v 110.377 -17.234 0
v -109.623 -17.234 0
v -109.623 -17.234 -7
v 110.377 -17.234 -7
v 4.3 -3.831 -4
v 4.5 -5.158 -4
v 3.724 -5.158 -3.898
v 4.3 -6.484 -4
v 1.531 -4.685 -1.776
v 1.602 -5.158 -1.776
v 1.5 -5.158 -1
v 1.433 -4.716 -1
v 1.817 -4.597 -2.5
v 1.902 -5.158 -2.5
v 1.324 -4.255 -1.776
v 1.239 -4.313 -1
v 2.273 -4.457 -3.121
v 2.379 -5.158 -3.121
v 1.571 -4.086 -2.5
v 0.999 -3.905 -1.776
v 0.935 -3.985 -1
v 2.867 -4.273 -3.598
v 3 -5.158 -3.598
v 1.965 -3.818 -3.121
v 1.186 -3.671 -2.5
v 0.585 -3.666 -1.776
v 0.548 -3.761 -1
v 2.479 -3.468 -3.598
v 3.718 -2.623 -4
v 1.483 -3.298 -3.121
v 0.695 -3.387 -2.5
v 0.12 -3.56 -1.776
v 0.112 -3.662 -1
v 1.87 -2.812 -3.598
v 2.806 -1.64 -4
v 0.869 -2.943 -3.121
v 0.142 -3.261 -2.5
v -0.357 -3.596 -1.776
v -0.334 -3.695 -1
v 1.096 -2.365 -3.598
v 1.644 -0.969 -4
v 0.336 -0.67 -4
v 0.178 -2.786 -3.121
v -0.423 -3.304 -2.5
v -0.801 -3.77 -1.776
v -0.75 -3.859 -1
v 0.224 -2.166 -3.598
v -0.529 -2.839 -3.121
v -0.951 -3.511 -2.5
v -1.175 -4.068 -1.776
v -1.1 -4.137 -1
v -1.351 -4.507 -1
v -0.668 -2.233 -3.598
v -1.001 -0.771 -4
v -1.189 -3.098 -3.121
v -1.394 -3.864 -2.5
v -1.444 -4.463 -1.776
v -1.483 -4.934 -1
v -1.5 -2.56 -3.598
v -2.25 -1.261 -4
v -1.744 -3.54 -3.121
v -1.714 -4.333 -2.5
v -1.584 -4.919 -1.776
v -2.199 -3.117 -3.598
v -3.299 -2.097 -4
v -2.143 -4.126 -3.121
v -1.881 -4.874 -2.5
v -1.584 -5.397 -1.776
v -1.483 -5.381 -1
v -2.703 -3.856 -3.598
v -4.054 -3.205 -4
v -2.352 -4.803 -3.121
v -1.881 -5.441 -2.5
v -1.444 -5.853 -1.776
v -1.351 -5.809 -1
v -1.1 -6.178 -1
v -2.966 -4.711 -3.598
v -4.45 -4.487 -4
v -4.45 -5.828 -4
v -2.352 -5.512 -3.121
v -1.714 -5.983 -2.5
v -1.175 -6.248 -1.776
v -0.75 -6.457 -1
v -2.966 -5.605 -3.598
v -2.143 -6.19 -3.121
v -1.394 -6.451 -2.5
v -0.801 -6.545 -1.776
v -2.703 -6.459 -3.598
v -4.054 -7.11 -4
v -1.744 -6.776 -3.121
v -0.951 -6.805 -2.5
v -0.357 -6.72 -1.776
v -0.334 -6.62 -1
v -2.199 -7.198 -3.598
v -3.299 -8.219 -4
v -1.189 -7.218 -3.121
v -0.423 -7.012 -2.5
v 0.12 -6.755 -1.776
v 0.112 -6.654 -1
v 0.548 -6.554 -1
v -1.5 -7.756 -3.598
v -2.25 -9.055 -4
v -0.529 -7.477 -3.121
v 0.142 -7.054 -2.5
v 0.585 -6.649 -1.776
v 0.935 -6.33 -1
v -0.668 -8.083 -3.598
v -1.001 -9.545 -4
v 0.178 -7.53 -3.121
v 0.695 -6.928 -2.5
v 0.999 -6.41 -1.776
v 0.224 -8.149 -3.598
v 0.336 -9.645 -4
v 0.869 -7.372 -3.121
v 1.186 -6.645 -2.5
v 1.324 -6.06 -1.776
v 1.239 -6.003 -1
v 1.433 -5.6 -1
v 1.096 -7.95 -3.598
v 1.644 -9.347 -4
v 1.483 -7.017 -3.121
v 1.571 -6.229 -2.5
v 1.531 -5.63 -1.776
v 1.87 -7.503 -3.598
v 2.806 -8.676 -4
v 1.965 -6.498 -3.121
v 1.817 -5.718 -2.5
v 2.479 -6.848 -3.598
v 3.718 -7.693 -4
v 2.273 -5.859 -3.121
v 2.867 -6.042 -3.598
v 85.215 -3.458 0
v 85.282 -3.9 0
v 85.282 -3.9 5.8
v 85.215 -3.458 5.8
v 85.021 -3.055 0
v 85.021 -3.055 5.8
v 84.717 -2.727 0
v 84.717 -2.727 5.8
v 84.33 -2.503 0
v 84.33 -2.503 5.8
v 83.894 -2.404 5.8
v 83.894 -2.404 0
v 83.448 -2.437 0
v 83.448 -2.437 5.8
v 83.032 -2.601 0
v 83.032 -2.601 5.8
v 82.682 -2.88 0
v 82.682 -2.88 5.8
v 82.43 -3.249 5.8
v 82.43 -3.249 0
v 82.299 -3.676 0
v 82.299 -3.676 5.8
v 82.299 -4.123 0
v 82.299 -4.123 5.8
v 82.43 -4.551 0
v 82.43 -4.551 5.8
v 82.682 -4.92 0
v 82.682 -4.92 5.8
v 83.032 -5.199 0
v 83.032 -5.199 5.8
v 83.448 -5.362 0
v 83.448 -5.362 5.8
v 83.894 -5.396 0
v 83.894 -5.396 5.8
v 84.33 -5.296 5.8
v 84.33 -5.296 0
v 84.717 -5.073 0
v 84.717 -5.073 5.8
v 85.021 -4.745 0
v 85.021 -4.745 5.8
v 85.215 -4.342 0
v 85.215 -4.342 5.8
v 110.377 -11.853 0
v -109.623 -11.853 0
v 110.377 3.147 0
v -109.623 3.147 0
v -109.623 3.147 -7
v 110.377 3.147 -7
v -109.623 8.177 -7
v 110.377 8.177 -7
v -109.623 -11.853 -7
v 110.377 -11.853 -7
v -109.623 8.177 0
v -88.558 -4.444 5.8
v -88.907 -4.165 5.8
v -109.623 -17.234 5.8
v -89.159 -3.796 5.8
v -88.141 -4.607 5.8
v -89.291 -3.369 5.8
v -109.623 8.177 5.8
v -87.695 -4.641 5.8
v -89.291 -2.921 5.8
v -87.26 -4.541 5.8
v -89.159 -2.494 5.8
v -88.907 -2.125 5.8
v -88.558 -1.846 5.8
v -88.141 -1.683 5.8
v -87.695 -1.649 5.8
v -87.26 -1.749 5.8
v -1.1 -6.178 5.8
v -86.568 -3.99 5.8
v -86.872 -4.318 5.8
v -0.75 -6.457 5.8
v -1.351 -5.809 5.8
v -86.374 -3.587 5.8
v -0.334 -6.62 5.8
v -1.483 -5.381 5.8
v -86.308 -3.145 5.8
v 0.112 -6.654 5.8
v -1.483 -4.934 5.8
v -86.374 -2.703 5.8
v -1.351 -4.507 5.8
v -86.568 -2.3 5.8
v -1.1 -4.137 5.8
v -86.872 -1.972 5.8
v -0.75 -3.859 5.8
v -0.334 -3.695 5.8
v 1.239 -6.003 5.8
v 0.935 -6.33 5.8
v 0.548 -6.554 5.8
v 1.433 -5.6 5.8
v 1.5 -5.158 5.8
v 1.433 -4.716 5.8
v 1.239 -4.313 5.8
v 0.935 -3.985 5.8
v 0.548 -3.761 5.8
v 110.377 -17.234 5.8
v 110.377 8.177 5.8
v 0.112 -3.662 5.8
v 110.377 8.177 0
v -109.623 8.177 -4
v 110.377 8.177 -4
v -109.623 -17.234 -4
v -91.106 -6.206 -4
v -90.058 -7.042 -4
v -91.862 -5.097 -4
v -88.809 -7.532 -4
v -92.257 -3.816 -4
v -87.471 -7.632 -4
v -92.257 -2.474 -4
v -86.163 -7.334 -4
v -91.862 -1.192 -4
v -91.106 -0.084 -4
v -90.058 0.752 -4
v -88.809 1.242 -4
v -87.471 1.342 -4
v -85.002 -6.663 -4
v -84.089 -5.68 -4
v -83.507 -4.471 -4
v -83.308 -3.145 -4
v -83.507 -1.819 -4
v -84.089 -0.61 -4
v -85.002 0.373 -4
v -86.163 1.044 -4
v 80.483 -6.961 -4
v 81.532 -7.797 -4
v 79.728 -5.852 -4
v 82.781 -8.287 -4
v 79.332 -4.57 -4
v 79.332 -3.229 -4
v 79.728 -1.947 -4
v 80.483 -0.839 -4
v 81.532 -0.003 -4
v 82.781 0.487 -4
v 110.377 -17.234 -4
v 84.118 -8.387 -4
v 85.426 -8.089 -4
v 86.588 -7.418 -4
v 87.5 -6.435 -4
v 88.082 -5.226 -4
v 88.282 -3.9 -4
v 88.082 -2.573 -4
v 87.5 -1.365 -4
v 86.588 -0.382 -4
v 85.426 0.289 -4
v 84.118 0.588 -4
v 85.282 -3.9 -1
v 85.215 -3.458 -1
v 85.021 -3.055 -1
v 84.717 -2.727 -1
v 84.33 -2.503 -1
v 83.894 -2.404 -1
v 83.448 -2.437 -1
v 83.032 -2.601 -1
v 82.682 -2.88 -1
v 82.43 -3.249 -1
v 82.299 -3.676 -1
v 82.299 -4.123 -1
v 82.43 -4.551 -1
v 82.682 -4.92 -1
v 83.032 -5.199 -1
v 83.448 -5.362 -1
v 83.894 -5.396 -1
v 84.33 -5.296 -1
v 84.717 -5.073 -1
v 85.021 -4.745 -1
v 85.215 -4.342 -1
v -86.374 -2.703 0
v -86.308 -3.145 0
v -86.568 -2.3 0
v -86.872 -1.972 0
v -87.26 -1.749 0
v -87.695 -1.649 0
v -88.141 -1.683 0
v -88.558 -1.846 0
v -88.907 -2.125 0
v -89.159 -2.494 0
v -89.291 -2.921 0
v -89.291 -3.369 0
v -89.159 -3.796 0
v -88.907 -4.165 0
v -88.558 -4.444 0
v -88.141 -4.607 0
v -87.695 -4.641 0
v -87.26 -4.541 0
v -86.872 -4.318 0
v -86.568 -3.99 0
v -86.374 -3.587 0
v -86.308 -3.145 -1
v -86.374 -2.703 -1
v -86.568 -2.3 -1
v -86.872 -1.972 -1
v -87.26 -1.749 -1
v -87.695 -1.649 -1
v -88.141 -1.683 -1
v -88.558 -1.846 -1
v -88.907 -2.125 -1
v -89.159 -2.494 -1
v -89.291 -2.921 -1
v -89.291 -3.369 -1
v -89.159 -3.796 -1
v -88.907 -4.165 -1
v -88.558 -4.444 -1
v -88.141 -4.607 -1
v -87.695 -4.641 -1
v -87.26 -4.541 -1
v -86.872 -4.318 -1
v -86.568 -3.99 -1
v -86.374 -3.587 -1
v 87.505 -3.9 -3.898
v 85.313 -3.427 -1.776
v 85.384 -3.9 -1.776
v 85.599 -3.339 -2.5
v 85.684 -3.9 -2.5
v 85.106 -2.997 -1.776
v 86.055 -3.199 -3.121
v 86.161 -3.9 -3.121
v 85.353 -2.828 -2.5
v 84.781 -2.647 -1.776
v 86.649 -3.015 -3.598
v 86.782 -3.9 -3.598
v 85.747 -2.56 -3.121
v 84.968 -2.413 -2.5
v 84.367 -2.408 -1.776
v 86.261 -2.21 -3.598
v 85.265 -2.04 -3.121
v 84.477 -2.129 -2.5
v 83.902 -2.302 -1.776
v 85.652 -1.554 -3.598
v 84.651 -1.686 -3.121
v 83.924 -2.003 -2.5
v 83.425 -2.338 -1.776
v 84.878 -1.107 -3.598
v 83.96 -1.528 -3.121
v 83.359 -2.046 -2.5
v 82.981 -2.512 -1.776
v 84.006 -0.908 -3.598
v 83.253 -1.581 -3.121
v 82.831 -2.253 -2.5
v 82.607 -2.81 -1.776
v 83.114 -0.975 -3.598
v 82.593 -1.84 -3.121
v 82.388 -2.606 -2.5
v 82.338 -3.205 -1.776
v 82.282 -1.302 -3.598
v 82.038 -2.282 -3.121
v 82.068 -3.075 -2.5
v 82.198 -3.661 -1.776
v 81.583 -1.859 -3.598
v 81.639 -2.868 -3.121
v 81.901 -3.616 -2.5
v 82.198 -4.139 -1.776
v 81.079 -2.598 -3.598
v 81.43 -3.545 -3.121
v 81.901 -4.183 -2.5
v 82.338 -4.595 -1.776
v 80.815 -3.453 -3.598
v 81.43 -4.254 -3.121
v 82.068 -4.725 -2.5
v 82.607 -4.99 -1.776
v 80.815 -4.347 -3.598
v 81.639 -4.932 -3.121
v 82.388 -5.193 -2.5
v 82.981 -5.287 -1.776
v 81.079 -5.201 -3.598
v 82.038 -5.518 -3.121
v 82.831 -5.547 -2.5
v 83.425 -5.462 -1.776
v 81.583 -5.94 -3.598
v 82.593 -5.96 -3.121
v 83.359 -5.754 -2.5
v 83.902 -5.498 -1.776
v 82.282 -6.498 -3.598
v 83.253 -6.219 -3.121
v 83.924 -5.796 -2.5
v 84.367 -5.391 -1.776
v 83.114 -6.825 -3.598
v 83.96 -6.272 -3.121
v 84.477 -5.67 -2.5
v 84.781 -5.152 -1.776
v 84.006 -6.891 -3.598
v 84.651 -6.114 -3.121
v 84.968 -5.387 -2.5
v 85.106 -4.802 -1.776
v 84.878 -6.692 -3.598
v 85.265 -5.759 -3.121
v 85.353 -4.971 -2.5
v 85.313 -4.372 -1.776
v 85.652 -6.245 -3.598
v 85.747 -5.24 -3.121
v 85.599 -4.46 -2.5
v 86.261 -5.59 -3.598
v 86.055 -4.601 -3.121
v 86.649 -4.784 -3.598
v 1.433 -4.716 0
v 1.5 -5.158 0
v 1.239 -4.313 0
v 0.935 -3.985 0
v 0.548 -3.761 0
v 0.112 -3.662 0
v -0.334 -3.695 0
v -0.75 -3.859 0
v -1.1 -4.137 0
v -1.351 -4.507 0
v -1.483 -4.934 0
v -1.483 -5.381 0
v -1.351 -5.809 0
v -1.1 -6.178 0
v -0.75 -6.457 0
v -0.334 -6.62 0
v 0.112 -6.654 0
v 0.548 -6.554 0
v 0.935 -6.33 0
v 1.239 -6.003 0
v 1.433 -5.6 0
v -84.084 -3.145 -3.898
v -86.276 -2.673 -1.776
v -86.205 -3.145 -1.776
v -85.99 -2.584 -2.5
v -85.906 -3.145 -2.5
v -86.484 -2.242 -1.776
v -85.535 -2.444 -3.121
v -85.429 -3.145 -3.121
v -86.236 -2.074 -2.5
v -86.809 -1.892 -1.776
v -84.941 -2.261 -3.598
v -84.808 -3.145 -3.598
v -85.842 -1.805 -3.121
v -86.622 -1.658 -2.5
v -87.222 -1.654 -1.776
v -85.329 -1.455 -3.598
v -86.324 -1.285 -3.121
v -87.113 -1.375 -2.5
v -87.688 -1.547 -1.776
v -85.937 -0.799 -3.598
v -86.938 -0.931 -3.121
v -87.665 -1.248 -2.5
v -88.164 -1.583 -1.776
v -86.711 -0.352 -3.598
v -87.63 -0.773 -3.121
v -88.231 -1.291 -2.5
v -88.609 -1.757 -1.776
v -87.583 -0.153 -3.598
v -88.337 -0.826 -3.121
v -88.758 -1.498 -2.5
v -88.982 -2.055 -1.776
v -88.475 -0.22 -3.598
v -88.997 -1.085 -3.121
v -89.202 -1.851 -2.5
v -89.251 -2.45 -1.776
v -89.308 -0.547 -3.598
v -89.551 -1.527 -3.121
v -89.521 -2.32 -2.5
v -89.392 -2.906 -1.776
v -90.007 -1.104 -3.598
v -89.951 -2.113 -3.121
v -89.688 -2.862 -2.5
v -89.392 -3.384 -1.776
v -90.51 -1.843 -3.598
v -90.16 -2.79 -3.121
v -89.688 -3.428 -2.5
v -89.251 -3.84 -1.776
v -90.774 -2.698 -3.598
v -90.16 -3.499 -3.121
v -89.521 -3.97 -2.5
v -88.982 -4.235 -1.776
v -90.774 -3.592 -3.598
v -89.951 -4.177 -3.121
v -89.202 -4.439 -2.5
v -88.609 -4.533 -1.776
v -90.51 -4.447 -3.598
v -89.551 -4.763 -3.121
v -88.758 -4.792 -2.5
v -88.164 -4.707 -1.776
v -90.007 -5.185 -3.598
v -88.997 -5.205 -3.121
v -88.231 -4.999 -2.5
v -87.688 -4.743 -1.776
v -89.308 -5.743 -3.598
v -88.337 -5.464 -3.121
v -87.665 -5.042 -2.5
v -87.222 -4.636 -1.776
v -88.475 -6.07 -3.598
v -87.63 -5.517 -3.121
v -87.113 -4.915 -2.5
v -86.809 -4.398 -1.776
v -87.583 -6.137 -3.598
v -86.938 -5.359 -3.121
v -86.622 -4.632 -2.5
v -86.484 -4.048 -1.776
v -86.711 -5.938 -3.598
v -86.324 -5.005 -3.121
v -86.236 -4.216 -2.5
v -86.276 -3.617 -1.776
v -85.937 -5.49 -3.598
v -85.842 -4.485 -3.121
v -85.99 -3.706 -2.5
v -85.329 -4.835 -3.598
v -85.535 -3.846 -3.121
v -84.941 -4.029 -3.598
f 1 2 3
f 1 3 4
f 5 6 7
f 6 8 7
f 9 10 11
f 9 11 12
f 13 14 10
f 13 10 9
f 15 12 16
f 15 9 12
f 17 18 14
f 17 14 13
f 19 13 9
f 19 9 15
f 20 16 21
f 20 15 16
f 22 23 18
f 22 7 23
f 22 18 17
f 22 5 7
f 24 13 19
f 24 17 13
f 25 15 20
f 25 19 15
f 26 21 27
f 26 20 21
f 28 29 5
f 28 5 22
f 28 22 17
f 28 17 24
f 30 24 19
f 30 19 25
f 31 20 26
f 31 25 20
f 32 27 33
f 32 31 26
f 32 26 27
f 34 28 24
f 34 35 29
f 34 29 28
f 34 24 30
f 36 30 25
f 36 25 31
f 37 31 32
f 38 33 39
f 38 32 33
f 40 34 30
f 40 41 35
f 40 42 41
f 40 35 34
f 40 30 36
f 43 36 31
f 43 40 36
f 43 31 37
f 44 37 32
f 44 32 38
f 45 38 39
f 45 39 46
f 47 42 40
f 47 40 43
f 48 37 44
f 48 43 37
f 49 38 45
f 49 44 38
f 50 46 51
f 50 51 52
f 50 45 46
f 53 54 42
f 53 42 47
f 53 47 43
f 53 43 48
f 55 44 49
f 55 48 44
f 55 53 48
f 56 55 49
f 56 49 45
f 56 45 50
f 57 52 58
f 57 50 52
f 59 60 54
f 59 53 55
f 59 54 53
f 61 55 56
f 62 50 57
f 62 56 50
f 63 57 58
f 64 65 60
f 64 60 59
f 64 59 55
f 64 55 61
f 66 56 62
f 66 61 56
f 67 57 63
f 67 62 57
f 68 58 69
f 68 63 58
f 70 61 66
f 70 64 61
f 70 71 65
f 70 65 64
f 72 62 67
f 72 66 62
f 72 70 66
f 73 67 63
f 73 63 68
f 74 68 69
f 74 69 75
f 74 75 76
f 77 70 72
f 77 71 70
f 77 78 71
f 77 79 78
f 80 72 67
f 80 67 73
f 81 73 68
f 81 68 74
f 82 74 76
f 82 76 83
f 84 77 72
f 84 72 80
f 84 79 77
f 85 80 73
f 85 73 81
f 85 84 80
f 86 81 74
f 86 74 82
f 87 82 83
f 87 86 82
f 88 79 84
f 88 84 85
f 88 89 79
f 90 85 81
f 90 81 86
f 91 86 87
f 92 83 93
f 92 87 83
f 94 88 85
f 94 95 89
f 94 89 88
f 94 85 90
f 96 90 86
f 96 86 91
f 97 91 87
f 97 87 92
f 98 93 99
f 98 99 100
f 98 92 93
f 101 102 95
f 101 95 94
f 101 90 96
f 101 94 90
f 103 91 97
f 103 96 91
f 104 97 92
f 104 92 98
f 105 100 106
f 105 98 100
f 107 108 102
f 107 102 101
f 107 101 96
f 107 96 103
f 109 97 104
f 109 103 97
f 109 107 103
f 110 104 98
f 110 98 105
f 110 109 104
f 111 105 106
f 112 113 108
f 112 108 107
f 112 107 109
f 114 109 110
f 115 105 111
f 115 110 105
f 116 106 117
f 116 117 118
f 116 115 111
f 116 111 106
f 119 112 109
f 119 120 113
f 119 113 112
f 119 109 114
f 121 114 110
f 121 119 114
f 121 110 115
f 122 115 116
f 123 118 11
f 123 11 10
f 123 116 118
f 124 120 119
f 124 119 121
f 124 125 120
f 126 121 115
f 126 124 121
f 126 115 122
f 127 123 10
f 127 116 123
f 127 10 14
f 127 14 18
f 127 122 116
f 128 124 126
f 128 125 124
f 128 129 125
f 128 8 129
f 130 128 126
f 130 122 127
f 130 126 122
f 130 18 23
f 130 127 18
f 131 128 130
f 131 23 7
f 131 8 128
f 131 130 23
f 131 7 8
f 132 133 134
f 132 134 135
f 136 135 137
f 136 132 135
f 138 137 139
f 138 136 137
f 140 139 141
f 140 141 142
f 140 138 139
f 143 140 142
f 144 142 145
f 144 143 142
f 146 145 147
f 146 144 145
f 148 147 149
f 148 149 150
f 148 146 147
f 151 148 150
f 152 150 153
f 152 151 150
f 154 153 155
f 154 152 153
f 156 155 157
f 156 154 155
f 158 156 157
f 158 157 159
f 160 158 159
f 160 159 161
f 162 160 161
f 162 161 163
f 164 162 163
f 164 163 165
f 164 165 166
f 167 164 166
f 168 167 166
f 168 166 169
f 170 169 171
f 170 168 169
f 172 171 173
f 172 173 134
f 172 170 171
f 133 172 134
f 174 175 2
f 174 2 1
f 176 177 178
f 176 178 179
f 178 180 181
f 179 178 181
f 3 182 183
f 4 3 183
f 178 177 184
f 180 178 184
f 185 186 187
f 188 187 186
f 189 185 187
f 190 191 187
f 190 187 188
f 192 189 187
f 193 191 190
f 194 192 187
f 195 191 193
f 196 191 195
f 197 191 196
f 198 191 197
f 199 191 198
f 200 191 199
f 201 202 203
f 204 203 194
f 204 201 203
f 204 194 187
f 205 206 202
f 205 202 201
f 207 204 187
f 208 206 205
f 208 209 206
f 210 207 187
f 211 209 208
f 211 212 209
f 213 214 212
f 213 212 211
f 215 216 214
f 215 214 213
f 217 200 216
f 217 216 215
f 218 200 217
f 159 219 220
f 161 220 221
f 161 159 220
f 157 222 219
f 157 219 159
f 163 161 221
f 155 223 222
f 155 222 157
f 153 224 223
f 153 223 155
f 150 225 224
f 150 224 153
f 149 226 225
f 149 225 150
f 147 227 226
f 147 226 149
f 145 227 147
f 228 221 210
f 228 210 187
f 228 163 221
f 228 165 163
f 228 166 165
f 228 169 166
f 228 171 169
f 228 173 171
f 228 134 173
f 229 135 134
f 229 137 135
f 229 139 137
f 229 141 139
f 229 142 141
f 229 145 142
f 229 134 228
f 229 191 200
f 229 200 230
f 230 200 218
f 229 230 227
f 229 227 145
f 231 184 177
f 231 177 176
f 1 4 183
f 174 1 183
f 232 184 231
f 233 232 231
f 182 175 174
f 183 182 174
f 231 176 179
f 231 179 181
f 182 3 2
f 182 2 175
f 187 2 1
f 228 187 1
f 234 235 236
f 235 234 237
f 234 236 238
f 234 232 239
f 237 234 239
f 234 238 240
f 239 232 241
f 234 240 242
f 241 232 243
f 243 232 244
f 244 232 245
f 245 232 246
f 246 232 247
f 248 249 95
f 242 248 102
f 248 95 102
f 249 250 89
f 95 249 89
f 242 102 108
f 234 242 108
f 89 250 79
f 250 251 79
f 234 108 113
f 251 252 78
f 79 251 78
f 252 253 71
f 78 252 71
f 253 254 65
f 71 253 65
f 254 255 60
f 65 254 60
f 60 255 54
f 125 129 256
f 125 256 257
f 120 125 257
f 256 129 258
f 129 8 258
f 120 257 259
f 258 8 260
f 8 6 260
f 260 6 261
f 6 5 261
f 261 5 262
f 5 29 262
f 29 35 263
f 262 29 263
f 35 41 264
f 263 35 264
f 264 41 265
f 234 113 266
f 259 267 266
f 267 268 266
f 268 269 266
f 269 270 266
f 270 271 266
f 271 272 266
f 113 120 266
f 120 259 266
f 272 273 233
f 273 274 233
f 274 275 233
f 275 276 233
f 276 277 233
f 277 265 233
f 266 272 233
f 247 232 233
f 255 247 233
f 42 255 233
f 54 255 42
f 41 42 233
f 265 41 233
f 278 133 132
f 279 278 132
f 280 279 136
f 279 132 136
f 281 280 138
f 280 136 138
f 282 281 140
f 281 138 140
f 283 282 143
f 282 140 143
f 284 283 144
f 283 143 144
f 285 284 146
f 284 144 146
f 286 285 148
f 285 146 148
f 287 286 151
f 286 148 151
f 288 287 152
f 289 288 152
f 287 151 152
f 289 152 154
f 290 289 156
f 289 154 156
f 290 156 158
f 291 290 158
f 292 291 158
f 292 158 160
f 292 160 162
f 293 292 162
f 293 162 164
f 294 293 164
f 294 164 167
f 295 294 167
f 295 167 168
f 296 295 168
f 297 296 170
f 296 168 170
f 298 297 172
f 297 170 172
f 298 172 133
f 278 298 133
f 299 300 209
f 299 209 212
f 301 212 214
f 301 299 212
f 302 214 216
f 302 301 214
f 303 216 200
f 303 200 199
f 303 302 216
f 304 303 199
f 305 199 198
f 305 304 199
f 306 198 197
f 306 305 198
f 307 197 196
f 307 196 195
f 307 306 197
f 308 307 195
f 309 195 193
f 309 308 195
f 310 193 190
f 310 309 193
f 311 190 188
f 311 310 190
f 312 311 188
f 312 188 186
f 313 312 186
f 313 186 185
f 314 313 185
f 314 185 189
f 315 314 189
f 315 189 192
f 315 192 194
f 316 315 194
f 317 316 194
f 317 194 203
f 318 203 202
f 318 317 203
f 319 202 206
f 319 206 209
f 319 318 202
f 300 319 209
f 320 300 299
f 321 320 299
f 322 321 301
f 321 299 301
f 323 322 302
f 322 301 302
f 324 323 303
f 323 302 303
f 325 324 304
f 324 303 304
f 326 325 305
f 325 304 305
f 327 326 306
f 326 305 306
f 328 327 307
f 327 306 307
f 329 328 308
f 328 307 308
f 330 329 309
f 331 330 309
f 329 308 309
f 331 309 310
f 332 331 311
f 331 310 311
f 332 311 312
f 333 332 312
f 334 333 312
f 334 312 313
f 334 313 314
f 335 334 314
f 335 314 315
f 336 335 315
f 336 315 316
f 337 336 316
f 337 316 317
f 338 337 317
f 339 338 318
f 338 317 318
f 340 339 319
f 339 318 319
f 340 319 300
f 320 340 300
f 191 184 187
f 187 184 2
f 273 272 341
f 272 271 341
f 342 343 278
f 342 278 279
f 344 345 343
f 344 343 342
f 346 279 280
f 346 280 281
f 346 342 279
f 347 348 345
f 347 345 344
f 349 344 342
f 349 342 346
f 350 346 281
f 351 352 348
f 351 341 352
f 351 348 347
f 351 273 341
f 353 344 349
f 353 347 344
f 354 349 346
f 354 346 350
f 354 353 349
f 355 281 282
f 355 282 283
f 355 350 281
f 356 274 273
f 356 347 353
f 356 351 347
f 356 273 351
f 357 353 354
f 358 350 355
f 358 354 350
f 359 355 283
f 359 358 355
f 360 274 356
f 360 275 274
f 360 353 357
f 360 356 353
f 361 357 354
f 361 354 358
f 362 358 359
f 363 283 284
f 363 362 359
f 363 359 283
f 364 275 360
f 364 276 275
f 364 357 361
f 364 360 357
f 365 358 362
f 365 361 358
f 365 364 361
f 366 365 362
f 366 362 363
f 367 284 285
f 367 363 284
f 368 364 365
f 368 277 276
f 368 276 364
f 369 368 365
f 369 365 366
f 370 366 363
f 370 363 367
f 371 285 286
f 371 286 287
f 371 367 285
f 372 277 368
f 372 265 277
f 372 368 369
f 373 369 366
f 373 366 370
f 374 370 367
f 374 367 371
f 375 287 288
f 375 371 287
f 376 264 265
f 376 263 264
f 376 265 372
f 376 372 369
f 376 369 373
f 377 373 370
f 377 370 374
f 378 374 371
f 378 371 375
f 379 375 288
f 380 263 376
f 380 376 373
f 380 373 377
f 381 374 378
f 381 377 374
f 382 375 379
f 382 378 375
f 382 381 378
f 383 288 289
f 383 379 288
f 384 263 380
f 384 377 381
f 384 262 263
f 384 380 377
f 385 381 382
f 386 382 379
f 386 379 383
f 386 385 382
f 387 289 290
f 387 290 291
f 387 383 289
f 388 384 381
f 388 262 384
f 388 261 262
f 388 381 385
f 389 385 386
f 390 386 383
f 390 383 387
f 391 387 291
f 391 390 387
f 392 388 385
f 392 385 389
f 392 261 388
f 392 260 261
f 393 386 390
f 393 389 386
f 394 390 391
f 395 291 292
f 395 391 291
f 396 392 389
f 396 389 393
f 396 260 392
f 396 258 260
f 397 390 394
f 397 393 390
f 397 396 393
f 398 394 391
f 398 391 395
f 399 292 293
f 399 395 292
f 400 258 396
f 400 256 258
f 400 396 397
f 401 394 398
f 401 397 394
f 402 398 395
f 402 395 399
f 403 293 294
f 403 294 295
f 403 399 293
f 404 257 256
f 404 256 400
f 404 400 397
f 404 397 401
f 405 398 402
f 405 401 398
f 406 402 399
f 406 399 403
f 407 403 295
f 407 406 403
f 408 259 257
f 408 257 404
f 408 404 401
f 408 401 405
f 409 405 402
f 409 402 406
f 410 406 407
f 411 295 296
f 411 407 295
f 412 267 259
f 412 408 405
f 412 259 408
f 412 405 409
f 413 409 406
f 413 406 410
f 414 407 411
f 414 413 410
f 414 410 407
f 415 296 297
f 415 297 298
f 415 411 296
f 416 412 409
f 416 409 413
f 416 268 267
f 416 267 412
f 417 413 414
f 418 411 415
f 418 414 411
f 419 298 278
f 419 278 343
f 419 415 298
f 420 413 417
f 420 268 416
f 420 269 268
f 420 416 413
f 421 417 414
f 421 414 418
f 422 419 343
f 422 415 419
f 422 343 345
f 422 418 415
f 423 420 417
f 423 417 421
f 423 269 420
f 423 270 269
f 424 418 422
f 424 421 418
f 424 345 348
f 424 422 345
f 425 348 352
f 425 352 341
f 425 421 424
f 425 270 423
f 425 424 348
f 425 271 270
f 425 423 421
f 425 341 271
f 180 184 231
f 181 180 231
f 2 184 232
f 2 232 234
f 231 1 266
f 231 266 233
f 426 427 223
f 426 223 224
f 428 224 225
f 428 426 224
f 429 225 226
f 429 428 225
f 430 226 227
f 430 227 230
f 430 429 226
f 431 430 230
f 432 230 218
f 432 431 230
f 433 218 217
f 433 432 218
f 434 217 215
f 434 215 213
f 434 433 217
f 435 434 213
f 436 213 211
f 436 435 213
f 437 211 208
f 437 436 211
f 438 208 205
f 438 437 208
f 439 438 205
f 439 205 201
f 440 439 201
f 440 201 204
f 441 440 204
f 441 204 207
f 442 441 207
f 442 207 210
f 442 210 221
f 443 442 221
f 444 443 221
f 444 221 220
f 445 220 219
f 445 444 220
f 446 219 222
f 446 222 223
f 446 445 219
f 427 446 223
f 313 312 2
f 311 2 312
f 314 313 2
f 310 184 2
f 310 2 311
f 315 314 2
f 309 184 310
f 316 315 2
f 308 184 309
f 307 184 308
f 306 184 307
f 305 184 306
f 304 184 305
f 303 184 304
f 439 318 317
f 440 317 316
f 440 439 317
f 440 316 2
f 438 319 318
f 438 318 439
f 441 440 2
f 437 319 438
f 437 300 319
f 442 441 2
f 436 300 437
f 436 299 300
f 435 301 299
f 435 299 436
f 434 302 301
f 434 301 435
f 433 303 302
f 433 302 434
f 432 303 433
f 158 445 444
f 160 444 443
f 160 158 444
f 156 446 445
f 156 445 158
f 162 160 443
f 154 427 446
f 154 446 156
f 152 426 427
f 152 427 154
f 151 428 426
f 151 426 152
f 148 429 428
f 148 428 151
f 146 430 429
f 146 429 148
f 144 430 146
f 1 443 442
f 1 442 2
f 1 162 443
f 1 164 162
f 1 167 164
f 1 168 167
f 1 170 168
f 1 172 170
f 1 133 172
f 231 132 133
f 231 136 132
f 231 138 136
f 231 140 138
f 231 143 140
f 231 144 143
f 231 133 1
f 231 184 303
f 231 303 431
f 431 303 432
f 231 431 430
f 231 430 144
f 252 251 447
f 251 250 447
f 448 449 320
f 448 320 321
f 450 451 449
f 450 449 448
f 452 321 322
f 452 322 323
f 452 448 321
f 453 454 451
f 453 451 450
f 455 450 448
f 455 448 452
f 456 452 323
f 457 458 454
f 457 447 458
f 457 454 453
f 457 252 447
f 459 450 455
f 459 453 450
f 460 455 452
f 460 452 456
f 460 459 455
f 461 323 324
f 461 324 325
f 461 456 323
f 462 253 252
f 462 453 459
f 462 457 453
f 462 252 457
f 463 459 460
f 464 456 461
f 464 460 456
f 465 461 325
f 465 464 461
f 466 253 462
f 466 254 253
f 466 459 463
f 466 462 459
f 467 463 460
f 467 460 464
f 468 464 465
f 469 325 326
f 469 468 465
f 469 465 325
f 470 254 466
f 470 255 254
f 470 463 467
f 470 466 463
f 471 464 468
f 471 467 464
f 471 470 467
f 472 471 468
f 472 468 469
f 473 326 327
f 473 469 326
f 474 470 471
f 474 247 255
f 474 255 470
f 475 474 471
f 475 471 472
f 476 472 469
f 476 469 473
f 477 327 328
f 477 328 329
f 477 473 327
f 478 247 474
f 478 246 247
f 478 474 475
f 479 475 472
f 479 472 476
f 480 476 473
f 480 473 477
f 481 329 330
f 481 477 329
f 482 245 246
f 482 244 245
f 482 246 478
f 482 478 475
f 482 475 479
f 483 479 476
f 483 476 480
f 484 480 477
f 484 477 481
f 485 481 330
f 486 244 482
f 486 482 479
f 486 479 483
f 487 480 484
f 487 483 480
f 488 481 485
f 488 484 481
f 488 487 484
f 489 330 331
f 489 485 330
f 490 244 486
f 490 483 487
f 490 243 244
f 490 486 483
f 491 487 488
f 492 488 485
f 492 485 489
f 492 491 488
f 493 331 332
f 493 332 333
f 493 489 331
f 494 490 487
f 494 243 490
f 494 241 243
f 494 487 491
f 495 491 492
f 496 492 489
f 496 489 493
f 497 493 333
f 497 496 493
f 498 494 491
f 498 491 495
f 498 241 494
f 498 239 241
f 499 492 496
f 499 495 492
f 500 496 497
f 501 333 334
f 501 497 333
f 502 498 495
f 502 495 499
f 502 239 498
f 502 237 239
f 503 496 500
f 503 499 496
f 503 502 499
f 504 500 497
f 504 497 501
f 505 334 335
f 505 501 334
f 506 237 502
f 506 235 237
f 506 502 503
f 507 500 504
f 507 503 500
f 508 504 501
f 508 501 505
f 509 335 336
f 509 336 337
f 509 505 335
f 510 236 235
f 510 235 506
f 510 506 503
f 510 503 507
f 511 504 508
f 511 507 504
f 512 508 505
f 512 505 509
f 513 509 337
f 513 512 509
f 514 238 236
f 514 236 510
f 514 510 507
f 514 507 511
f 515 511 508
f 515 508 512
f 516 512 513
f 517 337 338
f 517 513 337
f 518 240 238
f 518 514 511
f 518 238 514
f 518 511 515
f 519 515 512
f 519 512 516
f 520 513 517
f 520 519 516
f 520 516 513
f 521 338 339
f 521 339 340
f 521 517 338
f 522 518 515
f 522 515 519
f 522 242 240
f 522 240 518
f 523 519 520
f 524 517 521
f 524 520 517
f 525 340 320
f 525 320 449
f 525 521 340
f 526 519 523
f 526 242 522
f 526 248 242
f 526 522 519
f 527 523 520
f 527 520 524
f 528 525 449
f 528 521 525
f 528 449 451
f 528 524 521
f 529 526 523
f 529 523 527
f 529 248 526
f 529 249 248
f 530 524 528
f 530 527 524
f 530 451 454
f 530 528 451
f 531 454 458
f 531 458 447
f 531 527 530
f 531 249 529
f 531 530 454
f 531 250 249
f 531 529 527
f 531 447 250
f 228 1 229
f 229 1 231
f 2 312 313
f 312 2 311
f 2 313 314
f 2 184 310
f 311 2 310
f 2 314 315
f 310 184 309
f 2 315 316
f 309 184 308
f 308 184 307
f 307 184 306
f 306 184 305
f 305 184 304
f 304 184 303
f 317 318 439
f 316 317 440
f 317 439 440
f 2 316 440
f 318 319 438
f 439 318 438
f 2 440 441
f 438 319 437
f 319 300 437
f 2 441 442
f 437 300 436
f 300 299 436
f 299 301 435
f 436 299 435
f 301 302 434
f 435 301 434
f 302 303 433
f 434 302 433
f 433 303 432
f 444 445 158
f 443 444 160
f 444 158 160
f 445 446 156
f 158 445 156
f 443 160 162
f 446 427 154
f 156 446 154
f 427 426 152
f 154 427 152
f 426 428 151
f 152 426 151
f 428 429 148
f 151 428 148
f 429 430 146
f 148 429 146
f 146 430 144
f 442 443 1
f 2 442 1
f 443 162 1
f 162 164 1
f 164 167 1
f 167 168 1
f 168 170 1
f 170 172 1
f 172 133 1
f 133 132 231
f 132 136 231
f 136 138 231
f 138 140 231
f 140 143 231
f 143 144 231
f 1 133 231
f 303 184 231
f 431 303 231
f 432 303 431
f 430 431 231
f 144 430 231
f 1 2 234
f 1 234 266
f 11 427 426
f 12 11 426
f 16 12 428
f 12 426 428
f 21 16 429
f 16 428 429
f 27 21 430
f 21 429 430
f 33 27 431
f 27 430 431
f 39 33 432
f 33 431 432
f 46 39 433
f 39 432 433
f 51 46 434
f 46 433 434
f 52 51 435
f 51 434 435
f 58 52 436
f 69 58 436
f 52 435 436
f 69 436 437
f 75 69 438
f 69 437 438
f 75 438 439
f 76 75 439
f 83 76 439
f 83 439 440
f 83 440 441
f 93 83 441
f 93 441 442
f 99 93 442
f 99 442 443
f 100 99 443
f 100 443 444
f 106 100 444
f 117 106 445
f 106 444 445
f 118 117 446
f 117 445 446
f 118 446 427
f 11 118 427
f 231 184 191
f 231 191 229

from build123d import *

# Parameters (mm, degrees)
F0_W     = 220
F0_H     = 5.380979
F0_H_2   = 5.030364
F1_DEPTH = 7
F0_H_3   = 15
F0_R     = 1.5
F2_DEPTH = 5.8
F3_DEPTH = 4
F4_R     = 3


with BuildPart() as f1:
    # F0 (on Top) → F1 (new body)
    with BuildSketch(Plane.XY):
        with Locations((0.377394, -14.543936)):
            Rectangle(F0_W, F0_H)
        with Locations((0.377394, 5.661735)):
            Rectangle(F0_W, F0_H_2)
    extrude(amount=-F1_DEPTH)


with BuildPart() as f2:
    # F0 (on Top) → F2 (new body)
    with BuildSketch(Plane.XY):
        with Locations((0.377394, 5.661735)):
            Rectangle(F0_W, F0_H_2)
        with Locations((0.377394, -4.353447)):
            Rectangle(F0_W, F0_H_3)
        with Locations((0, -5.157748)):
            Circle(F0_R, mode=Mode.SUBTRACT)
        with Locations((-87.807514, -3.144968)):
            Circle(F0_R, mode=Mode.SUBTRACT)
        with Locations((83.78195, -3.899761)):
            Circle(F0_R, mode=Mode.SUBTRACT)
        with Locations((0.377394, -14.543936)):
            Rectangle(F0_W, F0_H)
    extrude(amount=F2_DEPTH)


with BuildPart() as f3:
    # F0 (on Top) → F3 (new body)
    with BuildSketch(Plane.XY):
        with Locations((0.377394, 5.661735)):
            Rectangle(F0_W, F0_H_2)
        with Locations((0.377394, -4.353447)):
            Rectangle(F0_W, F0_H_3)
        with Locations((0, -5.157748)):
            Circle(F0_R, mode=Mode.SUBTRACT)
        with Locations((-87.807514, -3.144968)):
            Circle(F0_R, mode=Mode.SUBTRACT)
        with Locations((83.78195, -3.899761)):
            Circle(F0_R, mode=Mode.SUBTRACT)
        with Locations((0.377394, -14.543936)):
            Rectangle(F0_W, F0_H)
    extrude(amount=-F3_DEPTH)

    # F4
    f4_edges = [f3.edges().sort_by_distance(p)[0] for p in [
        (-89.307514, -3.144968, -4),
        (82.28195, -3.899761, -4),
        (-1.5, -5.157748, -4),
    ]]
    fillet(f4_edges, radius=F4_R)


solid = Compound([f1.part, f2.part, f3.part])
